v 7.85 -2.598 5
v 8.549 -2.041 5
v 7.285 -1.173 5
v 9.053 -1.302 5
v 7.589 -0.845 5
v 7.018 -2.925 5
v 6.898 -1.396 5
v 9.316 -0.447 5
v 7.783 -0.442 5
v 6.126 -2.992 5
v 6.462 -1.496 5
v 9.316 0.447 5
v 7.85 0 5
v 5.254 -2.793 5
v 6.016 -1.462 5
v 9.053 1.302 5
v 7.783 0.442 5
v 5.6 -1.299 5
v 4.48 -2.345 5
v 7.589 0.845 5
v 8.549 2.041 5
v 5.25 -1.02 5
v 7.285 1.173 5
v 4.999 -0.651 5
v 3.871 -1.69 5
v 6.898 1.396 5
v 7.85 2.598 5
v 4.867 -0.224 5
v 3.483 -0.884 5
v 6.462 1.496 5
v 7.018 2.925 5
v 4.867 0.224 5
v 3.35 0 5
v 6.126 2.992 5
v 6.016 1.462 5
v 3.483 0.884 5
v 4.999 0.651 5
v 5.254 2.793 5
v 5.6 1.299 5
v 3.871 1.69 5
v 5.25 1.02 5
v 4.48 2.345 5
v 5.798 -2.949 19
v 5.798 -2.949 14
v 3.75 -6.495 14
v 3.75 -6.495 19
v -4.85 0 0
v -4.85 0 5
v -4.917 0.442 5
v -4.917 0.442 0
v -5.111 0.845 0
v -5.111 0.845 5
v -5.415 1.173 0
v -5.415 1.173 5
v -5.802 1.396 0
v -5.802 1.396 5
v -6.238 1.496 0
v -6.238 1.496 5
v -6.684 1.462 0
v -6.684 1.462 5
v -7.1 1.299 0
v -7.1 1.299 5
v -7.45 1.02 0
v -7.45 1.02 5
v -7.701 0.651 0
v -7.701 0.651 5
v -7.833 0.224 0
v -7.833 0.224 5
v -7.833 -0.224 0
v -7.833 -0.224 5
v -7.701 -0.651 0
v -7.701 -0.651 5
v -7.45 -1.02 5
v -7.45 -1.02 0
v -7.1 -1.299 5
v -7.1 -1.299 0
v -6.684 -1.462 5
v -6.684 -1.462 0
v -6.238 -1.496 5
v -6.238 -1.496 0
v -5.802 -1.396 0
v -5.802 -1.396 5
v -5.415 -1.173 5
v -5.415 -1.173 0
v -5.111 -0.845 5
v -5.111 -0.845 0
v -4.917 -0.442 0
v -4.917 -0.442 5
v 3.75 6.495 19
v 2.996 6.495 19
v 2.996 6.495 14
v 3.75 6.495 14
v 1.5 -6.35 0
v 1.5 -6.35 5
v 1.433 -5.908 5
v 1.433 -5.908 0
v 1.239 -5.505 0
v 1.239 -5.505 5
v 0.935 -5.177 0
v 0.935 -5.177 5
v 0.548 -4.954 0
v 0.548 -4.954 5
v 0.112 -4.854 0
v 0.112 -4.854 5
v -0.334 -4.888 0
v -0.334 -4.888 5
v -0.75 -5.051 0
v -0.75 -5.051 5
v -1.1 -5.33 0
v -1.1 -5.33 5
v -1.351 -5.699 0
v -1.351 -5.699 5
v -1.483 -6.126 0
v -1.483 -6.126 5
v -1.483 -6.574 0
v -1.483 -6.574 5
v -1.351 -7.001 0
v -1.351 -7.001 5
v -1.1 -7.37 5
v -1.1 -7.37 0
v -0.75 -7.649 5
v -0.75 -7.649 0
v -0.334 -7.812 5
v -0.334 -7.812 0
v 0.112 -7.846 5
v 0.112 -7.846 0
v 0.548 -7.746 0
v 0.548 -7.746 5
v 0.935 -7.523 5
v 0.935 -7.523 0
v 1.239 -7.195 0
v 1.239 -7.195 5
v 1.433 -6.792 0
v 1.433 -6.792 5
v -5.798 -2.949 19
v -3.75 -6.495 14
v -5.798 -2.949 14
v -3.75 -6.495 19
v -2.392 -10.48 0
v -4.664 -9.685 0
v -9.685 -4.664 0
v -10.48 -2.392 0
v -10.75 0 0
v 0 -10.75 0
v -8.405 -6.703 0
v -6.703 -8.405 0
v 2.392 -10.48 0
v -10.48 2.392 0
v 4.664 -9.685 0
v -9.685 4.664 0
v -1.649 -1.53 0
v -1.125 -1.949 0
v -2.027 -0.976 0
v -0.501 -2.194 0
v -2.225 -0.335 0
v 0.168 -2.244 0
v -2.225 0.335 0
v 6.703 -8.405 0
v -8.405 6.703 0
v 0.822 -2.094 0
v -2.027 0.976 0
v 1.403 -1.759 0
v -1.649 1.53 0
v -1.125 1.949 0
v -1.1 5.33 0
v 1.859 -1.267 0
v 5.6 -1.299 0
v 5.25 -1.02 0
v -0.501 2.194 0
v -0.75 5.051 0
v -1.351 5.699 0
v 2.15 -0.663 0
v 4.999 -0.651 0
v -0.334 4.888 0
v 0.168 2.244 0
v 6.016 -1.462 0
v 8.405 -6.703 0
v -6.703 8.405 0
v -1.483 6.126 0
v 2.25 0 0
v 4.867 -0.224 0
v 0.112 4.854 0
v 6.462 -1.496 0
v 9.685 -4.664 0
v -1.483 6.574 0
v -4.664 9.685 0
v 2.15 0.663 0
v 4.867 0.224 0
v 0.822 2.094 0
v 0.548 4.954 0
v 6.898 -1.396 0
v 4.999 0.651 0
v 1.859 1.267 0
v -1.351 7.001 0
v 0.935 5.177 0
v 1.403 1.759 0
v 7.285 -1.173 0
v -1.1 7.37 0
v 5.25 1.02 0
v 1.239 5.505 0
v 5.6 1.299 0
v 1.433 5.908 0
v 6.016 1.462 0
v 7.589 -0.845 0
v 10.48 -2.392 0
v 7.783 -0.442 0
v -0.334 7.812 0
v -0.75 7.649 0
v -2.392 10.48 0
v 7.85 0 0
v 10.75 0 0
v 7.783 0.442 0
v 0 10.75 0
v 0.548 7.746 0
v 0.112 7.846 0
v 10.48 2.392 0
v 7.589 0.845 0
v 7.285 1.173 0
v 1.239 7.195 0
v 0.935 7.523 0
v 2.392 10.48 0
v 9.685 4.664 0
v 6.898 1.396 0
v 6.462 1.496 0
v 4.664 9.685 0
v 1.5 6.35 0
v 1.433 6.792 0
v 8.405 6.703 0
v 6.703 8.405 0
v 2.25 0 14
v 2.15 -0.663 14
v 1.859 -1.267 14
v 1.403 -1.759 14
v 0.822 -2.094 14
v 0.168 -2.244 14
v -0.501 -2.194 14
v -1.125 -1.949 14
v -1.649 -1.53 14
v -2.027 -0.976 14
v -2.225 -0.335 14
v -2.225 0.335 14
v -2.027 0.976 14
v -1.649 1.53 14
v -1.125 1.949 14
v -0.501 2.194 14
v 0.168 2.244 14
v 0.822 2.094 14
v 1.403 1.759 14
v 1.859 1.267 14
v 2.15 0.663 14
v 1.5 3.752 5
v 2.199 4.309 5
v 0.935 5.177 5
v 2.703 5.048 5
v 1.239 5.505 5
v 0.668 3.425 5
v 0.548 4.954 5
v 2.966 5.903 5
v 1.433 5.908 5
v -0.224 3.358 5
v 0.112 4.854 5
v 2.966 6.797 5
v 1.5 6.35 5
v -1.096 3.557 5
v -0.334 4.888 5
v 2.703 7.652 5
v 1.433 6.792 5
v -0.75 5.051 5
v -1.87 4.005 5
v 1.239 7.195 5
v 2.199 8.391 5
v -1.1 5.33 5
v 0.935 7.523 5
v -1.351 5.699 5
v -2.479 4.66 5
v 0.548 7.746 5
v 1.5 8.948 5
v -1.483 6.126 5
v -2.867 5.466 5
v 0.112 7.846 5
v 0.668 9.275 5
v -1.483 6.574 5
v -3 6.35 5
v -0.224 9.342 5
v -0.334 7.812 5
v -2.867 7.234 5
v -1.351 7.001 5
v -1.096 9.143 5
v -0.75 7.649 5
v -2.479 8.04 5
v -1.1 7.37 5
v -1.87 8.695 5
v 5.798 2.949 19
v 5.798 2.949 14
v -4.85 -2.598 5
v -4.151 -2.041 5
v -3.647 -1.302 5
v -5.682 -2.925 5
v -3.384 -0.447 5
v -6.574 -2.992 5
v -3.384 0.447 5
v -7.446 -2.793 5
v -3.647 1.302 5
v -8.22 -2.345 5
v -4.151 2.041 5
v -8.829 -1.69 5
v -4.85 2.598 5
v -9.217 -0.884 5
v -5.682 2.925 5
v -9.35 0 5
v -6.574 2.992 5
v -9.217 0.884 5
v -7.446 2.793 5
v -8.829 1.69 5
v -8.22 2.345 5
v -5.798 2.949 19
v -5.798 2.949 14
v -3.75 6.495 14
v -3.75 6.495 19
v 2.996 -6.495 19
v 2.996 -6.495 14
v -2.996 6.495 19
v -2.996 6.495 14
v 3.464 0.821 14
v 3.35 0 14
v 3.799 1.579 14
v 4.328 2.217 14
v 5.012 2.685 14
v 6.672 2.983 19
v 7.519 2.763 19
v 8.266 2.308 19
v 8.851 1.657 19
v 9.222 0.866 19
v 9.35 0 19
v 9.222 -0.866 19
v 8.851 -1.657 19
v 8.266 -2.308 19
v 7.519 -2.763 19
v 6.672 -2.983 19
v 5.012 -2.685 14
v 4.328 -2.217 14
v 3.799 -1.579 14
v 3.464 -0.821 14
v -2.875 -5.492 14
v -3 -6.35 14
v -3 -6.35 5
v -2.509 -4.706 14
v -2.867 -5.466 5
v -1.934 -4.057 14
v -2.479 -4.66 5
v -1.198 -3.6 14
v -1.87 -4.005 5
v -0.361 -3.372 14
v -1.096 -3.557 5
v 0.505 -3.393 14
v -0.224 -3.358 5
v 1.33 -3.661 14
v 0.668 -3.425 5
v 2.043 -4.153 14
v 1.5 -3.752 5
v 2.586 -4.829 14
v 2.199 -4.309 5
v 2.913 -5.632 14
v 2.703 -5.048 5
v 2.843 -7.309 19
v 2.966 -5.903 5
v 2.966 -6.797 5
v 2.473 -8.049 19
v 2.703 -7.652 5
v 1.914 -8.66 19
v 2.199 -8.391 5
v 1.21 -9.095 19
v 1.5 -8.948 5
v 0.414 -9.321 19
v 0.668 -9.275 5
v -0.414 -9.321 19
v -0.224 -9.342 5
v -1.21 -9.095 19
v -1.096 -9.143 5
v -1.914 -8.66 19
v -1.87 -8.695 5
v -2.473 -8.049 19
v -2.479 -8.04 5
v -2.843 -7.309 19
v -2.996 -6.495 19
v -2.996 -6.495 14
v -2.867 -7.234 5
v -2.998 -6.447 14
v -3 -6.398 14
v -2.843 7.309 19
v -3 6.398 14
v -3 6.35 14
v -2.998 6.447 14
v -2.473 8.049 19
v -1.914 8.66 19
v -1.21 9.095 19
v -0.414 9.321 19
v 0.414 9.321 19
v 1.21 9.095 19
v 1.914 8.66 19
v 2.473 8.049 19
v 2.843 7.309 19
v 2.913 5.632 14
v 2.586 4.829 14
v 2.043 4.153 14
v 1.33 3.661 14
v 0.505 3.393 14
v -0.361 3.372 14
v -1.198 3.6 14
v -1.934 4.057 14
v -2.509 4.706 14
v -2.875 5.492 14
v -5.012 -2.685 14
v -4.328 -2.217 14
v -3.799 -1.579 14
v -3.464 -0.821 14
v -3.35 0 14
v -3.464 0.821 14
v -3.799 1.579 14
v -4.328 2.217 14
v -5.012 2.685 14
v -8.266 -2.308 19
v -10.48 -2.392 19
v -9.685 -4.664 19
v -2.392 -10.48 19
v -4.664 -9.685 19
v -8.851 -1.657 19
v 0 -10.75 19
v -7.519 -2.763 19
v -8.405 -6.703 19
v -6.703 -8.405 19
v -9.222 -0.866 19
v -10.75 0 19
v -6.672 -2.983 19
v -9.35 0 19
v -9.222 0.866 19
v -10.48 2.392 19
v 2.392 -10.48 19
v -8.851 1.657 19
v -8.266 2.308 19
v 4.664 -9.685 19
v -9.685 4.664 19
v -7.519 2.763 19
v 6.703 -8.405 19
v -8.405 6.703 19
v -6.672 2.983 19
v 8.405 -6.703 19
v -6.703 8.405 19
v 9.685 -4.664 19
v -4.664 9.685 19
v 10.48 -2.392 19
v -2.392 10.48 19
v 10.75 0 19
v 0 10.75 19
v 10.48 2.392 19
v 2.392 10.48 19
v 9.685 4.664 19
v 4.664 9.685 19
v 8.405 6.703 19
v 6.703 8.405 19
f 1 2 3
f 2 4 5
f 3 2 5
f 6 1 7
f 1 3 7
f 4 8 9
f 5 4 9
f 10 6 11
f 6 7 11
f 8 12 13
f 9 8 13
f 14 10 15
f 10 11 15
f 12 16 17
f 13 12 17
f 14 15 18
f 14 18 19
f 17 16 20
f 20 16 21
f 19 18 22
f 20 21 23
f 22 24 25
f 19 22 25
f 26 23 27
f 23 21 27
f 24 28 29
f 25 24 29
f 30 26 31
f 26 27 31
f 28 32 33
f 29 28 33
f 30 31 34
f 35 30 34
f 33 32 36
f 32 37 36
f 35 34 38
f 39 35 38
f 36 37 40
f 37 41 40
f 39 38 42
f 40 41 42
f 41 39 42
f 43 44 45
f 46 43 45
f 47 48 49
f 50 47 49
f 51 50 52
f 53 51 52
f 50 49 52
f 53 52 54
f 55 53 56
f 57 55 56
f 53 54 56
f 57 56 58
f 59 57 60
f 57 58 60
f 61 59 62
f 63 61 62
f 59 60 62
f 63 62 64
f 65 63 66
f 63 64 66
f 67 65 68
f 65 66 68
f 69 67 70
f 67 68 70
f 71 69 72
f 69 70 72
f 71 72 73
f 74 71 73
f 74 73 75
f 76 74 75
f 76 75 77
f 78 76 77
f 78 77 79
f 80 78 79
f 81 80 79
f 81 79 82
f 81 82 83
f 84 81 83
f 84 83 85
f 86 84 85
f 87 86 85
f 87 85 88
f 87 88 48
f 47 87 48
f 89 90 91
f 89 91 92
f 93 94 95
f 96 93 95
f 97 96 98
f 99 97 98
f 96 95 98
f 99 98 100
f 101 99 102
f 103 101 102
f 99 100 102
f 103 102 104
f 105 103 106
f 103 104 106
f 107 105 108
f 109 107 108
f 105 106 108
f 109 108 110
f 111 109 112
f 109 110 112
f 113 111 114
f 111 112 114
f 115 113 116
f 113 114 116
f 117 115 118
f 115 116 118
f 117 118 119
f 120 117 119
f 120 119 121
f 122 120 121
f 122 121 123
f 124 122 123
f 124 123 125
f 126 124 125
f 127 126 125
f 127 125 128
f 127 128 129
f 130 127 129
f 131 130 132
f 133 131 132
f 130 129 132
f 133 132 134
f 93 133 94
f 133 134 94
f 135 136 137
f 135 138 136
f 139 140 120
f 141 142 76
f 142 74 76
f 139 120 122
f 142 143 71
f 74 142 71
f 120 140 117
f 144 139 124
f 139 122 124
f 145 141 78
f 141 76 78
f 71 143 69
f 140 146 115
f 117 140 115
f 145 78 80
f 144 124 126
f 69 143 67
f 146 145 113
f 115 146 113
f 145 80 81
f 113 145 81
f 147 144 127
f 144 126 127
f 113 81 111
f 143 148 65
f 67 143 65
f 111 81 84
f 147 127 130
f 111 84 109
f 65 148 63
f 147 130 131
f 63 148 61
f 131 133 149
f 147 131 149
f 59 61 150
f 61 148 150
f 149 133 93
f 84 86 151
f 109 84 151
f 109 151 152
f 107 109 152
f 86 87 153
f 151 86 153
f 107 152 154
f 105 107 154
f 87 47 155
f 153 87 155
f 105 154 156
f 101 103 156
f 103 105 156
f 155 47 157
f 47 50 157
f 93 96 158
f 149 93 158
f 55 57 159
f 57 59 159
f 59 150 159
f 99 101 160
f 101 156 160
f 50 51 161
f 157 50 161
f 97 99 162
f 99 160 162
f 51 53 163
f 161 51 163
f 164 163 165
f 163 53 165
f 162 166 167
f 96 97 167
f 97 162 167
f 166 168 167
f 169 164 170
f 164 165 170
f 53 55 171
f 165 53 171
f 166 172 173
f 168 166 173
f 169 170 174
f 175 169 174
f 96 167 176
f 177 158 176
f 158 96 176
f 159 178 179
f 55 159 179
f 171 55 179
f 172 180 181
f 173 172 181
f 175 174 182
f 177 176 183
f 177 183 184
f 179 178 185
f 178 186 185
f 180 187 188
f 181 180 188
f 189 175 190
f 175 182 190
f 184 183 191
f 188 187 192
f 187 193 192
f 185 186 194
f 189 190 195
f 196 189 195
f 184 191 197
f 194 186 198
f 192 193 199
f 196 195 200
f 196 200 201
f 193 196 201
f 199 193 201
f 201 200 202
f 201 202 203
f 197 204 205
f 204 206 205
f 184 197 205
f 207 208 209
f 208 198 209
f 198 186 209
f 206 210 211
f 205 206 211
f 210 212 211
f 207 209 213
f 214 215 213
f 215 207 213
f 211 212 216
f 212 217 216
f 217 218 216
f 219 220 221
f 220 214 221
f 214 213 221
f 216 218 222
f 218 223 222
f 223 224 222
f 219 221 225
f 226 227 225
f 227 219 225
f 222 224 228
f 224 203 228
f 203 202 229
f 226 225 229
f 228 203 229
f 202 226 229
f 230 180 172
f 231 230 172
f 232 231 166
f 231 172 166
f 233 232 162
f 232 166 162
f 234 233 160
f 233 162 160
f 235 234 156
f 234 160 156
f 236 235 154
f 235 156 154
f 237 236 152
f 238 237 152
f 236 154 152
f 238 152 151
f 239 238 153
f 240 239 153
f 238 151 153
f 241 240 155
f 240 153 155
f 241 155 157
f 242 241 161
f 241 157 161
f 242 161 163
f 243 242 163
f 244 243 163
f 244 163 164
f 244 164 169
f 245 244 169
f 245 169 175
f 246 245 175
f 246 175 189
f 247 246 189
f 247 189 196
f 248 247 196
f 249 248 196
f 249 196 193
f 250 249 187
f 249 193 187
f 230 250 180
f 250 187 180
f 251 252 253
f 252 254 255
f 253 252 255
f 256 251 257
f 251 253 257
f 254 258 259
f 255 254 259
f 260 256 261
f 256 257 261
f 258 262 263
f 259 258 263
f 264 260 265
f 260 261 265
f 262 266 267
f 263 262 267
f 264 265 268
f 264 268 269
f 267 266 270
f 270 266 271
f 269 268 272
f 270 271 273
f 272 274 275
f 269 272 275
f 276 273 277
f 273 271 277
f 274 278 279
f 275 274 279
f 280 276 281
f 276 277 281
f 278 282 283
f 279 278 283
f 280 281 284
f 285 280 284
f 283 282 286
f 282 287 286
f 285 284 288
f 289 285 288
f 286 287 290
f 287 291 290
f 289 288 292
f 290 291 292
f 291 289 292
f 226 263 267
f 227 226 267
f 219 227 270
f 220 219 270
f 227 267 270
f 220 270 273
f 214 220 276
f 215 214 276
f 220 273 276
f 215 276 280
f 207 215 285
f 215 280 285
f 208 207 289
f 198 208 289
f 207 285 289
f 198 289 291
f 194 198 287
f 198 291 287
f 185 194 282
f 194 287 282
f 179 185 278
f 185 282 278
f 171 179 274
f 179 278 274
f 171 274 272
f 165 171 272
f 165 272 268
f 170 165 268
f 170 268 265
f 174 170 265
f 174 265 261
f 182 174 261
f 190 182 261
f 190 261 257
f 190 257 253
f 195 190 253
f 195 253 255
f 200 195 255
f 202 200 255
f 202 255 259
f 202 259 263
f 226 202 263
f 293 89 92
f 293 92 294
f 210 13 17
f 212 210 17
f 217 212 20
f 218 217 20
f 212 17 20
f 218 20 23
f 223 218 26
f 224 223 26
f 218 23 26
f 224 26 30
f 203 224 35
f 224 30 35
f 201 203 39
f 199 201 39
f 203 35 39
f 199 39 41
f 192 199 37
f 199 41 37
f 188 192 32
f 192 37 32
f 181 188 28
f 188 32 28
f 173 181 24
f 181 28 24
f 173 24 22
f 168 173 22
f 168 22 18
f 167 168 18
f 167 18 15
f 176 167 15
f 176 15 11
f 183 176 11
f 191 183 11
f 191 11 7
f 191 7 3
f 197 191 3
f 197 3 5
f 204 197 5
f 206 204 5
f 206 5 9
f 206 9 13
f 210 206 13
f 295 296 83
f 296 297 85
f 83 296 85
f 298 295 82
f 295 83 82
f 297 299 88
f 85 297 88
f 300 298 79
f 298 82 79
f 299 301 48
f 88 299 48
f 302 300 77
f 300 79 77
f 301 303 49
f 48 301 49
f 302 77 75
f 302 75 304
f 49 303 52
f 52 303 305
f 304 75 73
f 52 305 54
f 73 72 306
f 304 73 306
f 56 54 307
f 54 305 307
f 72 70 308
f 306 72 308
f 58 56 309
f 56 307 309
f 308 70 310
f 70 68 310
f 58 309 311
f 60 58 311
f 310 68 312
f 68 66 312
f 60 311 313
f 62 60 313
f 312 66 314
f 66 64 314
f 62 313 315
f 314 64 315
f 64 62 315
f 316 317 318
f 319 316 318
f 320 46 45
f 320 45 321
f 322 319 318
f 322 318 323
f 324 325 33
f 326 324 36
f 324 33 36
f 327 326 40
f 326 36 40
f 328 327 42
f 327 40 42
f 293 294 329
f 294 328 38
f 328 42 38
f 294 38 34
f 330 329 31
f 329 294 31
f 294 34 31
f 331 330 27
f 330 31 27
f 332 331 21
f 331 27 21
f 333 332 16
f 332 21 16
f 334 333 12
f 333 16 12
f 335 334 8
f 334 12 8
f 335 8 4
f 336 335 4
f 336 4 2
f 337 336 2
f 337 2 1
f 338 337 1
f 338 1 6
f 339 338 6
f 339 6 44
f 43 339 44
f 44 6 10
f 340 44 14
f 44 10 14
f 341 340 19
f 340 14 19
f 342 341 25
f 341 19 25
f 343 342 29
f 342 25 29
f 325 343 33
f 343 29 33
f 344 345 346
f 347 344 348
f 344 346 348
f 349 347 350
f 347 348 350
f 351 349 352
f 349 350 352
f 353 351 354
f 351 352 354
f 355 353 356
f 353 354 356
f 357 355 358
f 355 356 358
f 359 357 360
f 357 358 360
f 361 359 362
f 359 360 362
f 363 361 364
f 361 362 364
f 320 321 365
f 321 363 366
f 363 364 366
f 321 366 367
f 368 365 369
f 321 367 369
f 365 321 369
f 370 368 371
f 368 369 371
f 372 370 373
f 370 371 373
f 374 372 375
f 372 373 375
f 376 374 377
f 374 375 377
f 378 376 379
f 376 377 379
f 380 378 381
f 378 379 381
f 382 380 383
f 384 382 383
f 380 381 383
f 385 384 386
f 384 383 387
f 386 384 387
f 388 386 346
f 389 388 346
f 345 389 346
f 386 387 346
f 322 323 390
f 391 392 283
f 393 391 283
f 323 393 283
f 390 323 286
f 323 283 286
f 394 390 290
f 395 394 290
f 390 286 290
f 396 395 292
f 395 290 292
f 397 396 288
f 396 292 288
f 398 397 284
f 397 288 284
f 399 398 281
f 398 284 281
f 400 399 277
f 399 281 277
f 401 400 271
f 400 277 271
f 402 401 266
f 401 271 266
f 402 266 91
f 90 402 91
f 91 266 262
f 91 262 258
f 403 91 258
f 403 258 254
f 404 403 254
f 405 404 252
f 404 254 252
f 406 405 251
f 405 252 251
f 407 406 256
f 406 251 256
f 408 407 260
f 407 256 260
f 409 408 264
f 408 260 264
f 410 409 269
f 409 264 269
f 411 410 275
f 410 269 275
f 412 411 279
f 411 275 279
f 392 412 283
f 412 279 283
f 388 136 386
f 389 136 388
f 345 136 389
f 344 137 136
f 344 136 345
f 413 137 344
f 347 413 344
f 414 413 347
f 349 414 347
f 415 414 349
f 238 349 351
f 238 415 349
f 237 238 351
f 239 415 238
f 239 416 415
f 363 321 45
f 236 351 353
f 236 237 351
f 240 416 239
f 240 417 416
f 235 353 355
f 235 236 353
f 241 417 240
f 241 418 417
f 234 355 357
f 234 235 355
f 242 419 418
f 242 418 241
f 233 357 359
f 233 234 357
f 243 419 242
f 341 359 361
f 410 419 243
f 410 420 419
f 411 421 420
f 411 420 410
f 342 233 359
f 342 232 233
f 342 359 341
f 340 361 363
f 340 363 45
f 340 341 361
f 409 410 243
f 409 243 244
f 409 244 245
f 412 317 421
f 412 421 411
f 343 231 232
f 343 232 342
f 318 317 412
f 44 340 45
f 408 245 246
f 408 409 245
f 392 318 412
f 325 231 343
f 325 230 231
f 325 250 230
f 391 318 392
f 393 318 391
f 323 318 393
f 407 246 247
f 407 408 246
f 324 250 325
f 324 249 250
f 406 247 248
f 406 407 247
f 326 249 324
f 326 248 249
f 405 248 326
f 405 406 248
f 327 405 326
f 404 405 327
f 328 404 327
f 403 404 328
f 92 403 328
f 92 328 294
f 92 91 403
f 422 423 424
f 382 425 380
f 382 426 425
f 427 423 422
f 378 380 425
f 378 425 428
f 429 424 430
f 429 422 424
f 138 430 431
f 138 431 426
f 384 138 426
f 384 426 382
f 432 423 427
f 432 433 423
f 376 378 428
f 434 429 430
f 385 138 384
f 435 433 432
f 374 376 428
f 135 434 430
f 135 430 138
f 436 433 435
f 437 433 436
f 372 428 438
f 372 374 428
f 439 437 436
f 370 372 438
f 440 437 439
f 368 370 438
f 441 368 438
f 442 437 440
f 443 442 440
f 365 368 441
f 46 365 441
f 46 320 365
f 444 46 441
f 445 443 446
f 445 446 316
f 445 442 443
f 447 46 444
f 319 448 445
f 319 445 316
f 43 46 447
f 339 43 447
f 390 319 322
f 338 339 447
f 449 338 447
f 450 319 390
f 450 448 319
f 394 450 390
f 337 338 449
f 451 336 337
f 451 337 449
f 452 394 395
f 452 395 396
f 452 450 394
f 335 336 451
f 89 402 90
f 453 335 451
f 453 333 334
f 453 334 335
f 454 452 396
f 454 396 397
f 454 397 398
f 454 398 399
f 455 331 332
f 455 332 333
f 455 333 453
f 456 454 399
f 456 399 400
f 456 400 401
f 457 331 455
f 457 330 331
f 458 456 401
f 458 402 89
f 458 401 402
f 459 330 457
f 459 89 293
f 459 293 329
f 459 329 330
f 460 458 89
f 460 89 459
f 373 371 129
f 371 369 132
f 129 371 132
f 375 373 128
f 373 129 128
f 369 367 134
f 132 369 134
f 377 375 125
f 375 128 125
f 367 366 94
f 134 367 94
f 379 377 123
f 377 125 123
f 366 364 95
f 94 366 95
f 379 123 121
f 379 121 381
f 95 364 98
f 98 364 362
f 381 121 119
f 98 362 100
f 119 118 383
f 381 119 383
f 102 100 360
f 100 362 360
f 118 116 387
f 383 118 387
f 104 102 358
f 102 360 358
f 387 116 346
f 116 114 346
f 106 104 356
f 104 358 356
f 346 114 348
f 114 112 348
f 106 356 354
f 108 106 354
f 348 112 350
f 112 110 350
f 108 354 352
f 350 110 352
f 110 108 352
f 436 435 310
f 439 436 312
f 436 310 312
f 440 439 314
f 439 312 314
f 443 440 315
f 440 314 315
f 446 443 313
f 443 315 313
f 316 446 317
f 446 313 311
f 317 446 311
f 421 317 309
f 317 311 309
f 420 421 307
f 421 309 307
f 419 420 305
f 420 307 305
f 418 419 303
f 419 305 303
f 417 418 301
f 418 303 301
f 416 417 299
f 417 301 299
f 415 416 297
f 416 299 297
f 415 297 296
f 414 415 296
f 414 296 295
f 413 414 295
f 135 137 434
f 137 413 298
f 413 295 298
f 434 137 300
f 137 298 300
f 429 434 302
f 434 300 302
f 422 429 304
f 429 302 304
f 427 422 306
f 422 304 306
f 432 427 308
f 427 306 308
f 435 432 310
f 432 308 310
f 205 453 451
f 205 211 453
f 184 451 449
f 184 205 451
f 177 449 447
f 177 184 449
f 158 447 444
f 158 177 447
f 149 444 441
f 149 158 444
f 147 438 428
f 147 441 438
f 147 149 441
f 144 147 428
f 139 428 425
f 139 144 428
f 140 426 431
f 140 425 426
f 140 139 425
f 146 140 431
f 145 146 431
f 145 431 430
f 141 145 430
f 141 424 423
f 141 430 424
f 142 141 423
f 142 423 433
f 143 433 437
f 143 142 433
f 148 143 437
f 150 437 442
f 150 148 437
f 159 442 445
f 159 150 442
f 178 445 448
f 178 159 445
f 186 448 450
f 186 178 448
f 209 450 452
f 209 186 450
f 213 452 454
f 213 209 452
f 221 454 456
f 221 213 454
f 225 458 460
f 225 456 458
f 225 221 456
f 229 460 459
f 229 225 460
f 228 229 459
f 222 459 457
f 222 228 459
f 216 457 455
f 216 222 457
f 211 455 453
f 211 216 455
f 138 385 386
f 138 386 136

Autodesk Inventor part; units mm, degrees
ref_plane "YZ Plane" through (0, 0, 0) normal (1, 0, 0) x (0, 1, 0)
ref_plane "XZ Plane" through (0, 0, 0) normal (0, 1, 0) x (-1, 0, 0)
sketch "Sketch1" plane through (0, 0, 0) normal (0, 0, 1) x (1, 0, 0)
  circle A0 centre (0, 0) radius 10.75
  circle A1 centre (0, 0) radius 2.25
  dimension "d0" = 21.5
  dimension "d1" = 4.5
extrude "Extrusion1" add sketch "Sketch1" along normal blind 19
sketch "Sketch2" plane through (0, 0, 19) normal (0, 0, 1) x (1, 0, 0)
  line L0 (7.5, 0) -> (3.75, -6.4952)
  line L1 (3.75, -6.4952) -> (-3.75, -6.4952)
  line L2 (-3.75, -6.4952) -> (-7.5, 0)
  line L3 (-7.5, 0) -> (-3.75, 6.4952)
  line L4 (-3.75, 6.4952) -> (3.75, 6.4952)
  line L5 (3.75, 6.4952) -> (7.5, 0)
  point P0 (0, 0)
  point P1 (0, 0)
  dimension "d4" = 15
extrude "Extrusion2" cut sketch "Sketch2" against normal blind 5
sketch "Sketch9" plane through (0, 0, 19) normal (0, 0, 1) x (1, 0, 0)
  circle A0 centre (0, -6.35) radius 1.5
  circle A1 centre (0, 6.35) radius 1.5
  line L0 (0, 6.35) -> (0, -6.35) construction
  circle A2 centre (6.35, 0) radius 1.5
  circle A3 centre (-6.35, 0) radius 1.5
  line L1 (-6.35, 0) -> (6.35, 0) construction
  point P0 (0, 0)
  point P1 (0, 0)
  dimension "d19" = 3
  dimension "d20" = 3
  dimension "d21" = 12.7
  dimension "d22" = 3
  dimension "d23" = 3
  dimension "d24" = 12.7
extrude "Extrusion6" cut sketch "Sketch9" against normal through all
ref_plane "Work Plane2" through (0, 0, 5) normal (0, 0, -1) x (-1, 0, 0)
sketch "Sketch11" plane through (0, 0, 5) normal (0, 0, -1) x (-1, 0, 0)
  circle A0 centre (-6.35, 0) radius 1.5 projected
  circle A1 centre (-6.35, 0) radius 3
  circle A2 centre (0, 0) radius 2.25 construction
  circle A3 centre (0, -6.35) radius 3
  circle A4 centre (6.35, 0) radius 3
  circle A5 centre (0, 6.35) radius 3
  point P0 (6.35, 0)
  point P1 (0, 6.35)
  point P2 (0, -6.35)
  dimension "d32" = 6
  dimension "d40" = 360
extrude "Extrusion7" cut sketch "Sketch11" against normal through all contours A0 | A1 | A3 | A4 | A5
properties part number "AA031" material "ABS Plastic"
